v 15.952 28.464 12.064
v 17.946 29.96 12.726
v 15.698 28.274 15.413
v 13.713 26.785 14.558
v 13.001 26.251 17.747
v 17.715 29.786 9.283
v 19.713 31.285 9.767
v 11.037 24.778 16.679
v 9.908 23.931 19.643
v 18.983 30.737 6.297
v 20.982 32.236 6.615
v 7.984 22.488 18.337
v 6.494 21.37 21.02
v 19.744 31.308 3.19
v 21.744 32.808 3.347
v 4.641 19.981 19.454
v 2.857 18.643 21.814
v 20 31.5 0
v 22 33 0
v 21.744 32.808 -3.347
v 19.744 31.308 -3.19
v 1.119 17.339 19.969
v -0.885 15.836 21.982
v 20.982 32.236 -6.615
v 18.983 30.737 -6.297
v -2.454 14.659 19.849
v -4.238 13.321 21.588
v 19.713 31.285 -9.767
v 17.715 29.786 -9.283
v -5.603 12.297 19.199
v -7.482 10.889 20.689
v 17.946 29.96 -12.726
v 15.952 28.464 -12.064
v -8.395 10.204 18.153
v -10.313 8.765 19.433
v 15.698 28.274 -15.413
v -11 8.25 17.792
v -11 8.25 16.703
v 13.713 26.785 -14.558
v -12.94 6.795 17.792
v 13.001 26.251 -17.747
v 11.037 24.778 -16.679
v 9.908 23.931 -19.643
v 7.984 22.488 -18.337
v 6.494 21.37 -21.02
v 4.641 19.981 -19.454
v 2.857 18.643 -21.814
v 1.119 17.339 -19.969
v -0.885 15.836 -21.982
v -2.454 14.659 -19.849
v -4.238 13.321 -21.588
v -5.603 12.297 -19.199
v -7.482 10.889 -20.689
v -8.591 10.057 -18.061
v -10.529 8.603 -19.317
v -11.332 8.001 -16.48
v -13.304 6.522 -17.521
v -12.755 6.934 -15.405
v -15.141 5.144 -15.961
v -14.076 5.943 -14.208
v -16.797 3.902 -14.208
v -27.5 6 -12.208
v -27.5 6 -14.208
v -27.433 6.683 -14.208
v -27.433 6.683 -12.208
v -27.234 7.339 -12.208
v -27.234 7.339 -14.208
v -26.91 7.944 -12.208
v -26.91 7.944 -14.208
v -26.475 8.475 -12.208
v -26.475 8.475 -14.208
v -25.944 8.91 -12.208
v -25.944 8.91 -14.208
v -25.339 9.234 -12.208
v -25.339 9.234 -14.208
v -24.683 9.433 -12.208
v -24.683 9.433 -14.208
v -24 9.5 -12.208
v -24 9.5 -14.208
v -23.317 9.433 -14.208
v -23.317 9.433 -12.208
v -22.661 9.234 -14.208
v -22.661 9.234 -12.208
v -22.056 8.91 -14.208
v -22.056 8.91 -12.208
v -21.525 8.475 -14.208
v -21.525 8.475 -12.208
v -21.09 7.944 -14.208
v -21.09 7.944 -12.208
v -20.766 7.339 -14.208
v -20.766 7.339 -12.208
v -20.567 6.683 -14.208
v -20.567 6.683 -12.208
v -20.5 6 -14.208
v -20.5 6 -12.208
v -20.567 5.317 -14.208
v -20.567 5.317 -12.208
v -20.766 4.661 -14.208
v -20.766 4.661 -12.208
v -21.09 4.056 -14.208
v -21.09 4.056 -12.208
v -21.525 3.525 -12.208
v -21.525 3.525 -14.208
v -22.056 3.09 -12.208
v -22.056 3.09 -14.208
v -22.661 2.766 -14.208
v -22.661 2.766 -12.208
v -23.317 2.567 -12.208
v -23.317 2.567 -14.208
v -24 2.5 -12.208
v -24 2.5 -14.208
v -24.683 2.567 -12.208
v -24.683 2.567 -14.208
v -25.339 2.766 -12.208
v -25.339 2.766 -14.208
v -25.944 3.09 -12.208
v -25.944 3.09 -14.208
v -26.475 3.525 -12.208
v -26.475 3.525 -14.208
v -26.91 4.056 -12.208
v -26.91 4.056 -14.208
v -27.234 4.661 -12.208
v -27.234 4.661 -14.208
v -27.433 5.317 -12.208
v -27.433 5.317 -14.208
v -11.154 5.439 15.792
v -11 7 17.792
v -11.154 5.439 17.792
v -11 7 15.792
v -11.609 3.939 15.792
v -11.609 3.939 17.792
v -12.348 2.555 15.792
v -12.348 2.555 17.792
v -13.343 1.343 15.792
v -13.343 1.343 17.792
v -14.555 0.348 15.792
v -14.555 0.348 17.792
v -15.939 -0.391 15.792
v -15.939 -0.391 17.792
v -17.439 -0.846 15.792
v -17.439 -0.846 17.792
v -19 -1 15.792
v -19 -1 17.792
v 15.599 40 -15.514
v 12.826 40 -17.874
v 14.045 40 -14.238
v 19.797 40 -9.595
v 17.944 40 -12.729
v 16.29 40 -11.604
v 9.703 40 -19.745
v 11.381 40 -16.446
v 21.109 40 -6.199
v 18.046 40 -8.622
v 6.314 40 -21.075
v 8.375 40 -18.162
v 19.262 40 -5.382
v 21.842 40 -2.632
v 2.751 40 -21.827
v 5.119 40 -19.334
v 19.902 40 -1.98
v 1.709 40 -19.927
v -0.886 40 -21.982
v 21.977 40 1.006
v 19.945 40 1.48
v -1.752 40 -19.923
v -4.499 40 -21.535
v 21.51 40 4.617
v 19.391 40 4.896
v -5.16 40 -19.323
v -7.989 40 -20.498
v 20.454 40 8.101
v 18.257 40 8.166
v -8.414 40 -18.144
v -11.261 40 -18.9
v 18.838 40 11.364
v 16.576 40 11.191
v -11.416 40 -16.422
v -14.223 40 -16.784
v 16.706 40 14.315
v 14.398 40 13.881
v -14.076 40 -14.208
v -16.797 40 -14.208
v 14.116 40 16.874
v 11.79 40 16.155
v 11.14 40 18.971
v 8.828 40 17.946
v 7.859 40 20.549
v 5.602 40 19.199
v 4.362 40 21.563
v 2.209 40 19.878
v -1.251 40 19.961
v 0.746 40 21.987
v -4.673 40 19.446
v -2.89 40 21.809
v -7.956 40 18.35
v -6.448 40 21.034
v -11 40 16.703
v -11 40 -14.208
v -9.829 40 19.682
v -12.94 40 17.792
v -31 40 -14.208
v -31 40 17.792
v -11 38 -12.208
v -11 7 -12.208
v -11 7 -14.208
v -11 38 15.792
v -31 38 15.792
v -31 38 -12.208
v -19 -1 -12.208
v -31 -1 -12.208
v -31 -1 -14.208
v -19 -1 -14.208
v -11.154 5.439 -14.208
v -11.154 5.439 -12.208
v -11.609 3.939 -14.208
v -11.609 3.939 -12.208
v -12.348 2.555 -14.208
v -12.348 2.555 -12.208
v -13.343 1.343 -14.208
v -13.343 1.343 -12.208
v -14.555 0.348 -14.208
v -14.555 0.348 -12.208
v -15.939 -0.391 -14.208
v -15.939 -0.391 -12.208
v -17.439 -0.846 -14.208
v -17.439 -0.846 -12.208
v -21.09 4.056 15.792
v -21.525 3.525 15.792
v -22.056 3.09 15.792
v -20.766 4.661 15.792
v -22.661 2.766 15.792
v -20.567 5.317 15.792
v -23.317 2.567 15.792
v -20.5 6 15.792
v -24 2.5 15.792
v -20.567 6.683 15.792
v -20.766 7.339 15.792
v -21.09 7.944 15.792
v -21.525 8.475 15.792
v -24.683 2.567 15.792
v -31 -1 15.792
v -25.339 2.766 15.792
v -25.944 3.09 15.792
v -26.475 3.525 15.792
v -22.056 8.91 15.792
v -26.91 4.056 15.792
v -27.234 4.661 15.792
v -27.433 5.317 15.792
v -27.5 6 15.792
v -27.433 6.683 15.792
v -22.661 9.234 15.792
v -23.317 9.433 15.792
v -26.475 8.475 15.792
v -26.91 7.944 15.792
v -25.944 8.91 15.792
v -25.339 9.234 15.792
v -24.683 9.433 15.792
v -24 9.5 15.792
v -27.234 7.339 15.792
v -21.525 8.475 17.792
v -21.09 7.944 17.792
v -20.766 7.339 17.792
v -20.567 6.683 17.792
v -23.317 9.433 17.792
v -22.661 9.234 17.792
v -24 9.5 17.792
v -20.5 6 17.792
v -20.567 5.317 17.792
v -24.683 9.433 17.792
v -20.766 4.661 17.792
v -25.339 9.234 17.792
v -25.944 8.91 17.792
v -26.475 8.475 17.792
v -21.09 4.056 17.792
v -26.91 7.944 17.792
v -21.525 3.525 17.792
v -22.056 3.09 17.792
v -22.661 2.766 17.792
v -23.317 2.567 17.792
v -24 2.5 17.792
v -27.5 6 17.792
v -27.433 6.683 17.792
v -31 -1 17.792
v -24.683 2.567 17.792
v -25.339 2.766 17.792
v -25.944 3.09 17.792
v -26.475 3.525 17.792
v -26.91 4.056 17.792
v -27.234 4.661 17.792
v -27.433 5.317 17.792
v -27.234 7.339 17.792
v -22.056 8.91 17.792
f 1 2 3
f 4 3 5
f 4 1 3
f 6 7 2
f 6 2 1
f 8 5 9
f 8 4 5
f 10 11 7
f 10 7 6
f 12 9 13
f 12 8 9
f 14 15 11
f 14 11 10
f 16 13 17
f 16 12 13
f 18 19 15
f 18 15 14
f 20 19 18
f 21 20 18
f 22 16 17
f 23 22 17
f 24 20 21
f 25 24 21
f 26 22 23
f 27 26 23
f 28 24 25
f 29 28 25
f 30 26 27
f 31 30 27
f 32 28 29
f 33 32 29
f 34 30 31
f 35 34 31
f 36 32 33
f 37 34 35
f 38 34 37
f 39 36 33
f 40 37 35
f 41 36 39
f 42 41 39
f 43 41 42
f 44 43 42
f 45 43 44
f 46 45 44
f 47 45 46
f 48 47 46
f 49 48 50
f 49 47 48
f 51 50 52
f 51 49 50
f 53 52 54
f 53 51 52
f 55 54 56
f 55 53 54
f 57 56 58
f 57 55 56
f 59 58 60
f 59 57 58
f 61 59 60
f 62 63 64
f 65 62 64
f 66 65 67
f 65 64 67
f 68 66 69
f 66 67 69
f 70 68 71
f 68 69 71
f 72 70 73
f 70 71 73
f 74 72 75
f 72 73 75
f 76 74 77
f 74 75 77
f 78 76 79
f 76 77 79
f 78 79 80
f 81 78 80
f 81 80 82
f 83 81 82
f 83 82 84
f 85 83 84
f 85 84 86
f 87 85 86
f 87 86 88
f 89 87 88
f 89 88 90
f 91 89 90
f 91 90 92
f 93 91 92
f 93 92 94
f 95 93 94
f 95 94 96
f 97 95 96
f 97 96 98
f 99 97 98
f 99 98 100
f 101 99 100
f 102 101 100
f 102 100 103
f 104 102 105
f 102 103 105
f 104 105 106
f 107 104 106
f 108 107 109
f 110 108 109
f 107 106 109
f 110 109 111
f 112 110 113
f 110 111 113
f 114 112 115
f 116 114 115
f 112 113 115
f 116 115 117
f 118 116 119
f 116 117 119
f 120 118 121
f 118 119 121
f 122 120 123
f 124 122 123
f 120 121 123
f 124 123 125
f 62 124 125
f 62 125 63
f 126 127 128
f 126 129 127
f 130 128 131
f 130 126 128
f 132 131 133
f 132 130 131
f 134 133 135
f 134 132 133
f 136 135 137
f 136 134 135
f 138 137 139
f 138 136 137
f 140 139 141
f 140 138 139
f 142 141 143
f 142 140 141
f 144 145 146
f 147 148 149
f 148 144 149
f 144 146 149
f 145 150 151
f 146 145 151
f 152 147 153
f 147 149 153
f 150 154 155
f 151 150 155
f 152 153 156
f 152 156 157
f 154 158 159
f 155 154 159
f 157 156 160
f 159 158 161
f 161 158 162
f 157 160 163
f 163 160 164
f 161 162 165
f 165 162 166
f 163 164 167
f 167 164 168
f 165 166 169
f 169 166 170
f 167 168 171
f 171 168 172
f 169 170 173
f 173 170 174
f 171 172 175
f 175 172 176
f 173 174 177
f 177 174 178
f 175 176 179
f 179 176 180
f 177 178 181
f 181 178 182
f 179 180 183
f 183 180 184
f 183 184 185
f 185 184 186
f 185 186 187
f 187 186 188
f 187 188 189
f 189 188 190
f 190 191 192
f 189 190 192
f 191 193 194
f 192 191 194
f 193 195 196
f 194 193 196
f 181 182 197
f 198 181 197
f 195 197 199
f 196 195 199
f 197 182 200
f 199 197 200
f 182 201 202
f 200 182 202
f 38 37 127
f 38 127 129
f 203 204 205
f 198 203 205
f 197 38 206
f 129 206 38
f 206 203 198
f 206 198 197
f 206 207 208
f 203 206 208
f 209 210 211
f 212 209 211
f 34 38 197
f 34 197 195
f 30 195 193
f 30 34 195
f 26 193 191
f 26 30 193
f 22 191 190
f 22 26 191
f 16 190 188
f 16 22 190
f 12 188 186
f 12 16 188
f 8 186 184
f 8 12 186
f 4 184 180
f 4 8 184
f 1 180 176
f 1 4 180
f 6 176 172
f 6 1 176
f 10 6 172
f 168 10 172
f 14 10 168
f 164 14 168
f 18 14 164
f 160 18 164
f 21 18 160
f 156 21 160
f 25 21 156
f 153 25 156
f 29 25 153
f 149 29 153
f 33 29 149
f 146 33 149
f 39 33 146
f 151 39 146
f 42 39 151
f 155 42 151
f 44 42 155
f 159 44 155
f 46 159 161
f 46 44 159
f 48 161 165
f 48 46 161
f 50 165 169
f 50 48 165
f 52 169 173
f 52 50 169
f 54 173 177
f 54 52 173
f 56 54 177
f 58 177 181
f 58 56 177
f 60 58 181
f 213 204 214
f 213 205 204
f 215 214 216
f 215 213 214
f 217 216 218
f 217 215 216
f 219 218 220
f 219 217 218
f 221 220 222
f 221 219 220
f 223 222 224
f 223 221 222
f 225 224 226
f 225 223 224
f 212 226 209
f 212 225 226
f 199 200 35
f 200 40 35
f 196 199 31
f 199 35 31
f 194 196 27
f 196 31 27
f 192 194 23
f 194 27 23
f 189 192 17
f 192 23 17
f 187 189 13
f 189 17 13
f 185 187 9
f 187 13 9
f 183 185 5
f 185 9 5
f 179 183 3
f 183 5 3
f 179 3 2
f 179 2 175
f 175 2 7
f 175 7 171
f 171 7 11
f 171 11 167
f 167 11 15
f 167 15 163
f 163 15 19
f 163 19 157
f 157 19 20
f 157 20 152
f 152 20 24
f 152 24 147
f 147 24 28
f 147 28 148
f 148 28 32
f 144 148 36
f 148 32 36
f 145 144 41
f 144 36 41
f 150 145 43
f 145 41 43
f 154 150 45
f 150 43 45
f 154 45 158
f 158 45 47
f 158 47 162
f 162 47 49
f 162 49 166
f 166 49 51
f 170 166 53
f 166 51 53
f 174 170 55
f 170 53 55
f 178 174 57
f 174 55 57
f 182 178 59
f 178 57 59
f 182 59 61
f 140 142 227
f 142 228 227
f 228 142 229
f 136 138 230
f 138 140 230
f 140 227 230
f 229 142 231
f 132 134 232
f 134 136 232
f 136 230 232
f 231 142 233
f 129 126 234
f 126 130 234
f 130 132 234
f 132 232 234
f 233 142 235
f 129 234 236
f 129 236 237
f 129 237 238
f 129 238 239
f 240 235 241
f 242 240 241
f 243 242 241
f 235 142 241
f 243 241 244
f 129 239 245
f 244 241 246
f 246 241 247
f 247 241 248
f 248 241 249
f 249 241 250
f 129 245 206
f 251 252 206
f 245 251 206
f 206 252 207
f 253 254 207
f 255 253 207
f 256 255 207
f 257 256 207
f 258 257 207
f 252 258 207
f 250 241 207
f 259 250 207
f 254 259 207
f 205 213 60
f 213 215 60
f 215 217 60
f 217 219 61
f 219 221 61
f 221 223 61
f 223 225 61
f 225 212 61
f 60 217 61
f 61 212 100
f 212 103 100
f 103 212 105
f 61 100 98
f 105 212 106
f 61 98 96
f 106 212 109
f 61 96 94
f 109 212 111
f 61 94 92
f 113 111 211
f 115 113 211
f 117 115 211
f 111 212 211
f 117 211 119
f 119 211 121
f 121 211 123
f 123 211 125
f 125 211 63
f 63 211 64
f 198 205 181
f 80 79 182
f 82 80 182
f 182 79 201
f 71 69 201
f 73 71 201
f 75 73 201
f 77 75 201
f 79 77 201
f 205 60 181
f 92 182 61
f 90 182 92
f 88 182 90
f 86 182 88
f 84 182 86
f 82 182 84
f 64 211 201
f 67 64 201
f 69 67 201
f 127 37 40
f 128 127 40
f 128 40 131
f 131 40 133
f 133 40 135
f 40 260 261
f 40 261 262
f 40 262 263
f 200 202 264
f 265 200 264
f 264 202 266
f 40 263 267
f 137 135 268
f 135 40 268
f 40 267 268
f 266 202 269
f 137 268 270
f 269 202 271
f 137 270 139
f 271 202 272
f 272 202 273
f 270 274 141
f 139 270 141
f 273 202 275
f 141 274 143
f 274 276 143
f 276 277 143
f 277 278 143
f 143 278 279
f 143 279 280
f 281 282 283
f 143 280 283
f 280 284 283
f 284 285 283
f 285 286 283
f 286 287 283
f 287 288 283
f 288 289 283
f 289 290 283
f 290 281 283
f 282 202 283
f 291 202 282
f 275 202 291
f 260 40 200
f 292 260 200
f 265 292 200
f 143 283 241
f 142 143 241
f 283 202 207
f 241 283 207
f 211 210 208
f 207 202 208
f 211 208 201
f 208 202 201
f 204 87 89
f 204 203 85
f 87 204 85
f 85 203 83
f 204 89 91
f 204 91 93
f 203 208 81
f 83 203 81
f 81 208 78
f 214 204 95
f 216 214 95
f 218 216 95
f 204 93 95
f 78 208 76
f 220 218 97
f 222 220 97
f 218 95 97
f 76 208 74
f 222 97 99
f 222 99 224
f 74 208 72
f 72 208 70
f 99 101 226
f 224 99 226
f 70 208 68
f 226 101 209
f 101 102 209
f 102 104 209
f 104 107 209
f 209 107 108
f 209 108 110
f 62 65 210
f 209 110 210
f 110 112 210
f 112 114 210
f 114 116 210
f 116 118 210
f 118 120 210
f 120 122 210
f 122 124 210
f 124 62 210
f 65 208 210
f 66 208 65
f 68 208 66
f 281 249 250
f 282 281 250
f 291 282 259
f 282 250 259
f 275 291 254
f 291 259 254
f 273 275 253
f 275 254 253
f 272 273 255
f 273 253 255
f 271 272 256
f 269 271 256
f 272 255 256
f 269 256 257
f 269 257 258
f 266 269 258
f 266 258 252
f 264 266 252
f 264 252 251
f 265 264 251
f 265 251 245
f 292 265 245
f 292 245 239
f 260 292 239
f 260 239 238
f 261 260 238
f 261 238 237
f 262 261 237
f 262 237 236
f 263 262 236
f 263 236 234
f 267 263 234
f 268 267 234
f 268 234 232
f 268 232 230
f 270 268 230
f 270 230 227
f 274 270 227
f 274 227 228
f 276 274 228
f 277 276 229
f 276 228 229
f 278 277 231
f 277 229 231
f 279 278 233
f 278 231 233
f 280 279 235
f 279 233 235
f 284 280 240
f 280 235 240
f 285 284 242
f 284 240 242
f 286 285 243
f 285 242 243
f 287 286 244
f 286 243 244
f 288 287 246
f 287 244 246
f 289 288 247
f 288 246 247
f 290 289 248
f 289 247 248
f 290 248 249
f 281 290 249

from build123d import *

# Parameters (mm, degrees)
SKETCH1_R               = 22
SKETCH1_R_2             = 20
BOSS_EXTRUDE1_DEPTH     = 40
CUT_EXTRUDE1_DEPTH      = 23
CUT_EXTRUDE1_DEPTH_BACK = 23
BOSS_EXTRUDE2_DEPTH     = 20
SKETCH4_W               = 28
SKETCH4_H               = 39
CUT_EXTRUDE2_DEPTH      = 32
SKETCH5_R               = 3.5
CUT_EXTRUDE3_DEPTH      = 8.79196205
CUT_EXTRUDE3_DEPTH_BACK = 37.20803795
FILLET1_R               = 8


with BuildPart() as part:
    # Sketch1 → Boss-Extrude1 (new body)
    with BuildSketch(Plane(origin=(0, 0, 0), x_dir=(1, 0, 0), z_dir=(0, 1, 0))):
        Circle(SKETCH1_R)
        Circle(SKETCH1_R_2, mode=Mode.SUBTRACT)
    extrude(amount=BOSS_EXTRUDE1_DEPTH)

    # Sketch2 → Cut-Extrude1 (cut, two sides)
    with BuildSketch(Plane.XY) as cut_extrude1_sk:
        Polygon((22, 33), (-22, 0), (22, 0), align=None)
    extrude(amount=CUT_EXTRUDE1_DEPTH, mode=Mode.SUBTRACT)
    extrude(cut_extrude1_sk.sketch, amount=-CUT_EXTRUDE1_DEPTH_BACK, mode=Mode.SUBTRACT)

    # Sketch3 → Boss-Extrude2 (add)
    with BuildSketch(Plane(origin=(-31, 0, 0), x_dir=(0, 0, -1), z_dir=(1, 0, 0))):
        Polygon((14.20803795, 40), (-17.79196205, 40), (-17.79196205, -1), (-15.79196205, -1), (-15.79196205, 1), (-15.79196205, 38), (12.20803795, 38), (12.20803795, 1), (12.20803795, -1), (14.20803795, -1), align=None)
    extrude(amount=BOSS_EXTRUDE2_DEPTH)

    # Sketch4 → Cut-Extrude2 (cut, through all)
    with BuildSketch(Plane(origin=(0, 0, 0), x_dir=(0, 0, -1), z_dir=(1, 0, 0))):
        with Locations((-1.79196205, 18.5)):
            Rectangle(SKETCH4_W, SKETCH4_H)
    extrude(amount=-CUT_EXTRUDE2_DEPTH, mode=Mode.SUBTRACT)

    # Sketch5 → Cut-Extrude3 (cut, two sides)
    with BuildSketch(Plane(origin=(0, 0, -14.20803795), x_dir=(-1, 0, 0), z_dir=(0, 0, -1))) as cut_extrude3_sk:
        with Locations((24, 6)):
            Circle(SKETCH5_R)
    extrude(amount=CUT_EXTRUDE3_DEPTH, mode=Mode.SUBTRACT)
    extrude(cut_extrude3_sk.sketch, amount=-CUT_EXTRUDE3_DEPTH_BACK, mode=Mode.SUBTRACT)

    # Fillet1
    fillet1_edges = [part.edges().sort_by_distance(p)[0] for p in [
        (-11, -1, 16.79196205),
        (-11, -1, -13.20803795),
    ]]
    fillet(fillet1_edges, radius=FILLET1_R)


solid = part.part
